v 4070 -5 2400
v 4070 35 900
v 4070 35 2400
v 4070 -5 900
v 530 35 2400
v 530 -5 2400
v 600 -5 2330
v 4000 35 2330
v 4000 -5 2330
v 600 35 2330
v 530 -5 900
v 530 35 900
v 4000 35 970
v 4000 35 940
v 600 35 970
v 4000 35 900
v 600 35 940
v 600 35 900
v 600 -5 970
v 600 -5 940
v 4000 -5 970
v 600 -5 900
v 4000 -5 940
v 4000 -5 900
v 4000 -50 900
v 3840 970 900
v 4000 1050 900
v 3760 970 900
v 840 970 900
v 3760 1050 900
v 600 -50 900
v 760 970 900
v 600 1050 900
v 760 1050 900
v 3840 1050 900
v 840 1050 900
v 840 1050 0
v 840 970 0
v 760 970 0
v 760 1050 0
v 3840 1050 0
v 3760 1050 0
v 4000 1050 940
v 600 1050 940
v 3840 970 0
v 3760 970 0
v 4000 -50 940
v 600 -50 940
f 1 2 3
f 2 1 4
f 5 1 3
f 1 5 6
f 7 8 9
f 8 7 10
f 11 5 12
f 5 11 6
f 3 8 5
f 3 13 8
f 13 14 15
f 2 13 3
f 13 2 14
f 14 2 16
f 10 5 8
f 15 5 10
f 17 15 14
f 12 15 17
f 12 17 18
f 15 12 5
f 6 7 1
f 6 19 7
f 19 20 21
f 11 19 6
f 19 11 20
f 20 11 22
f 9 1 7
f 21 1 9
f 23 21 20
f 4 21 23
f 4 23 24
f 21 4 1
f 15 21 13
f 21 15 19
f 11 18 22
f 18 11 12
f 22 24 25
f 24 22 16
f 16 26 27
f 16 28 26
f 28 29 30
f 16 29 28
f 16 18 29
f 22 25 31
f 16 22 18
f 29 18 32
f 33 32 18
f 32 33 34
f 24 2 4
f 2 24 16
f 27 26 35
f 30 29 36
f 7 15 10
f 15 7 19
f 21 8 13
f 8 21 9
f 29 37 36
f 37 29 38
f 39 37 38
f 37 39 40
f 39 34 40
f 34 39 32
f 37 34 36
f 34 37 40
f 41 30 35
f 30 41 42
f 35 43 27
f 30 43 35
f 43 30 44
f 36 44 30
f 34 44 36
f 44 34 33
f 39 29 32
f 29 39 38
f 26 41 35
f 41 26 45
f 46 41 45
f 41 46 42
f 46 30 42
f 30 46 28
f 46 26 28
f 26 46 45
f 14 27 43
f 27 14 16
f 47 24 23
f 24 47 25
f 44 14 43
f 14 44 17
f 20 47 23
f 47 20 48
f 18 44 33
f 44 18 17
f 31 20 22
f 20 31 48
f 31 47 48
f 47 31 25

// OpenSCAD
// part_window_header.scad — Export the top horizontal frame bar as standalone OBJ.
// Press F6 (render), then File -> Export as OBJ.
include <tea_shop_counter_modules.scad>;
window_header();
